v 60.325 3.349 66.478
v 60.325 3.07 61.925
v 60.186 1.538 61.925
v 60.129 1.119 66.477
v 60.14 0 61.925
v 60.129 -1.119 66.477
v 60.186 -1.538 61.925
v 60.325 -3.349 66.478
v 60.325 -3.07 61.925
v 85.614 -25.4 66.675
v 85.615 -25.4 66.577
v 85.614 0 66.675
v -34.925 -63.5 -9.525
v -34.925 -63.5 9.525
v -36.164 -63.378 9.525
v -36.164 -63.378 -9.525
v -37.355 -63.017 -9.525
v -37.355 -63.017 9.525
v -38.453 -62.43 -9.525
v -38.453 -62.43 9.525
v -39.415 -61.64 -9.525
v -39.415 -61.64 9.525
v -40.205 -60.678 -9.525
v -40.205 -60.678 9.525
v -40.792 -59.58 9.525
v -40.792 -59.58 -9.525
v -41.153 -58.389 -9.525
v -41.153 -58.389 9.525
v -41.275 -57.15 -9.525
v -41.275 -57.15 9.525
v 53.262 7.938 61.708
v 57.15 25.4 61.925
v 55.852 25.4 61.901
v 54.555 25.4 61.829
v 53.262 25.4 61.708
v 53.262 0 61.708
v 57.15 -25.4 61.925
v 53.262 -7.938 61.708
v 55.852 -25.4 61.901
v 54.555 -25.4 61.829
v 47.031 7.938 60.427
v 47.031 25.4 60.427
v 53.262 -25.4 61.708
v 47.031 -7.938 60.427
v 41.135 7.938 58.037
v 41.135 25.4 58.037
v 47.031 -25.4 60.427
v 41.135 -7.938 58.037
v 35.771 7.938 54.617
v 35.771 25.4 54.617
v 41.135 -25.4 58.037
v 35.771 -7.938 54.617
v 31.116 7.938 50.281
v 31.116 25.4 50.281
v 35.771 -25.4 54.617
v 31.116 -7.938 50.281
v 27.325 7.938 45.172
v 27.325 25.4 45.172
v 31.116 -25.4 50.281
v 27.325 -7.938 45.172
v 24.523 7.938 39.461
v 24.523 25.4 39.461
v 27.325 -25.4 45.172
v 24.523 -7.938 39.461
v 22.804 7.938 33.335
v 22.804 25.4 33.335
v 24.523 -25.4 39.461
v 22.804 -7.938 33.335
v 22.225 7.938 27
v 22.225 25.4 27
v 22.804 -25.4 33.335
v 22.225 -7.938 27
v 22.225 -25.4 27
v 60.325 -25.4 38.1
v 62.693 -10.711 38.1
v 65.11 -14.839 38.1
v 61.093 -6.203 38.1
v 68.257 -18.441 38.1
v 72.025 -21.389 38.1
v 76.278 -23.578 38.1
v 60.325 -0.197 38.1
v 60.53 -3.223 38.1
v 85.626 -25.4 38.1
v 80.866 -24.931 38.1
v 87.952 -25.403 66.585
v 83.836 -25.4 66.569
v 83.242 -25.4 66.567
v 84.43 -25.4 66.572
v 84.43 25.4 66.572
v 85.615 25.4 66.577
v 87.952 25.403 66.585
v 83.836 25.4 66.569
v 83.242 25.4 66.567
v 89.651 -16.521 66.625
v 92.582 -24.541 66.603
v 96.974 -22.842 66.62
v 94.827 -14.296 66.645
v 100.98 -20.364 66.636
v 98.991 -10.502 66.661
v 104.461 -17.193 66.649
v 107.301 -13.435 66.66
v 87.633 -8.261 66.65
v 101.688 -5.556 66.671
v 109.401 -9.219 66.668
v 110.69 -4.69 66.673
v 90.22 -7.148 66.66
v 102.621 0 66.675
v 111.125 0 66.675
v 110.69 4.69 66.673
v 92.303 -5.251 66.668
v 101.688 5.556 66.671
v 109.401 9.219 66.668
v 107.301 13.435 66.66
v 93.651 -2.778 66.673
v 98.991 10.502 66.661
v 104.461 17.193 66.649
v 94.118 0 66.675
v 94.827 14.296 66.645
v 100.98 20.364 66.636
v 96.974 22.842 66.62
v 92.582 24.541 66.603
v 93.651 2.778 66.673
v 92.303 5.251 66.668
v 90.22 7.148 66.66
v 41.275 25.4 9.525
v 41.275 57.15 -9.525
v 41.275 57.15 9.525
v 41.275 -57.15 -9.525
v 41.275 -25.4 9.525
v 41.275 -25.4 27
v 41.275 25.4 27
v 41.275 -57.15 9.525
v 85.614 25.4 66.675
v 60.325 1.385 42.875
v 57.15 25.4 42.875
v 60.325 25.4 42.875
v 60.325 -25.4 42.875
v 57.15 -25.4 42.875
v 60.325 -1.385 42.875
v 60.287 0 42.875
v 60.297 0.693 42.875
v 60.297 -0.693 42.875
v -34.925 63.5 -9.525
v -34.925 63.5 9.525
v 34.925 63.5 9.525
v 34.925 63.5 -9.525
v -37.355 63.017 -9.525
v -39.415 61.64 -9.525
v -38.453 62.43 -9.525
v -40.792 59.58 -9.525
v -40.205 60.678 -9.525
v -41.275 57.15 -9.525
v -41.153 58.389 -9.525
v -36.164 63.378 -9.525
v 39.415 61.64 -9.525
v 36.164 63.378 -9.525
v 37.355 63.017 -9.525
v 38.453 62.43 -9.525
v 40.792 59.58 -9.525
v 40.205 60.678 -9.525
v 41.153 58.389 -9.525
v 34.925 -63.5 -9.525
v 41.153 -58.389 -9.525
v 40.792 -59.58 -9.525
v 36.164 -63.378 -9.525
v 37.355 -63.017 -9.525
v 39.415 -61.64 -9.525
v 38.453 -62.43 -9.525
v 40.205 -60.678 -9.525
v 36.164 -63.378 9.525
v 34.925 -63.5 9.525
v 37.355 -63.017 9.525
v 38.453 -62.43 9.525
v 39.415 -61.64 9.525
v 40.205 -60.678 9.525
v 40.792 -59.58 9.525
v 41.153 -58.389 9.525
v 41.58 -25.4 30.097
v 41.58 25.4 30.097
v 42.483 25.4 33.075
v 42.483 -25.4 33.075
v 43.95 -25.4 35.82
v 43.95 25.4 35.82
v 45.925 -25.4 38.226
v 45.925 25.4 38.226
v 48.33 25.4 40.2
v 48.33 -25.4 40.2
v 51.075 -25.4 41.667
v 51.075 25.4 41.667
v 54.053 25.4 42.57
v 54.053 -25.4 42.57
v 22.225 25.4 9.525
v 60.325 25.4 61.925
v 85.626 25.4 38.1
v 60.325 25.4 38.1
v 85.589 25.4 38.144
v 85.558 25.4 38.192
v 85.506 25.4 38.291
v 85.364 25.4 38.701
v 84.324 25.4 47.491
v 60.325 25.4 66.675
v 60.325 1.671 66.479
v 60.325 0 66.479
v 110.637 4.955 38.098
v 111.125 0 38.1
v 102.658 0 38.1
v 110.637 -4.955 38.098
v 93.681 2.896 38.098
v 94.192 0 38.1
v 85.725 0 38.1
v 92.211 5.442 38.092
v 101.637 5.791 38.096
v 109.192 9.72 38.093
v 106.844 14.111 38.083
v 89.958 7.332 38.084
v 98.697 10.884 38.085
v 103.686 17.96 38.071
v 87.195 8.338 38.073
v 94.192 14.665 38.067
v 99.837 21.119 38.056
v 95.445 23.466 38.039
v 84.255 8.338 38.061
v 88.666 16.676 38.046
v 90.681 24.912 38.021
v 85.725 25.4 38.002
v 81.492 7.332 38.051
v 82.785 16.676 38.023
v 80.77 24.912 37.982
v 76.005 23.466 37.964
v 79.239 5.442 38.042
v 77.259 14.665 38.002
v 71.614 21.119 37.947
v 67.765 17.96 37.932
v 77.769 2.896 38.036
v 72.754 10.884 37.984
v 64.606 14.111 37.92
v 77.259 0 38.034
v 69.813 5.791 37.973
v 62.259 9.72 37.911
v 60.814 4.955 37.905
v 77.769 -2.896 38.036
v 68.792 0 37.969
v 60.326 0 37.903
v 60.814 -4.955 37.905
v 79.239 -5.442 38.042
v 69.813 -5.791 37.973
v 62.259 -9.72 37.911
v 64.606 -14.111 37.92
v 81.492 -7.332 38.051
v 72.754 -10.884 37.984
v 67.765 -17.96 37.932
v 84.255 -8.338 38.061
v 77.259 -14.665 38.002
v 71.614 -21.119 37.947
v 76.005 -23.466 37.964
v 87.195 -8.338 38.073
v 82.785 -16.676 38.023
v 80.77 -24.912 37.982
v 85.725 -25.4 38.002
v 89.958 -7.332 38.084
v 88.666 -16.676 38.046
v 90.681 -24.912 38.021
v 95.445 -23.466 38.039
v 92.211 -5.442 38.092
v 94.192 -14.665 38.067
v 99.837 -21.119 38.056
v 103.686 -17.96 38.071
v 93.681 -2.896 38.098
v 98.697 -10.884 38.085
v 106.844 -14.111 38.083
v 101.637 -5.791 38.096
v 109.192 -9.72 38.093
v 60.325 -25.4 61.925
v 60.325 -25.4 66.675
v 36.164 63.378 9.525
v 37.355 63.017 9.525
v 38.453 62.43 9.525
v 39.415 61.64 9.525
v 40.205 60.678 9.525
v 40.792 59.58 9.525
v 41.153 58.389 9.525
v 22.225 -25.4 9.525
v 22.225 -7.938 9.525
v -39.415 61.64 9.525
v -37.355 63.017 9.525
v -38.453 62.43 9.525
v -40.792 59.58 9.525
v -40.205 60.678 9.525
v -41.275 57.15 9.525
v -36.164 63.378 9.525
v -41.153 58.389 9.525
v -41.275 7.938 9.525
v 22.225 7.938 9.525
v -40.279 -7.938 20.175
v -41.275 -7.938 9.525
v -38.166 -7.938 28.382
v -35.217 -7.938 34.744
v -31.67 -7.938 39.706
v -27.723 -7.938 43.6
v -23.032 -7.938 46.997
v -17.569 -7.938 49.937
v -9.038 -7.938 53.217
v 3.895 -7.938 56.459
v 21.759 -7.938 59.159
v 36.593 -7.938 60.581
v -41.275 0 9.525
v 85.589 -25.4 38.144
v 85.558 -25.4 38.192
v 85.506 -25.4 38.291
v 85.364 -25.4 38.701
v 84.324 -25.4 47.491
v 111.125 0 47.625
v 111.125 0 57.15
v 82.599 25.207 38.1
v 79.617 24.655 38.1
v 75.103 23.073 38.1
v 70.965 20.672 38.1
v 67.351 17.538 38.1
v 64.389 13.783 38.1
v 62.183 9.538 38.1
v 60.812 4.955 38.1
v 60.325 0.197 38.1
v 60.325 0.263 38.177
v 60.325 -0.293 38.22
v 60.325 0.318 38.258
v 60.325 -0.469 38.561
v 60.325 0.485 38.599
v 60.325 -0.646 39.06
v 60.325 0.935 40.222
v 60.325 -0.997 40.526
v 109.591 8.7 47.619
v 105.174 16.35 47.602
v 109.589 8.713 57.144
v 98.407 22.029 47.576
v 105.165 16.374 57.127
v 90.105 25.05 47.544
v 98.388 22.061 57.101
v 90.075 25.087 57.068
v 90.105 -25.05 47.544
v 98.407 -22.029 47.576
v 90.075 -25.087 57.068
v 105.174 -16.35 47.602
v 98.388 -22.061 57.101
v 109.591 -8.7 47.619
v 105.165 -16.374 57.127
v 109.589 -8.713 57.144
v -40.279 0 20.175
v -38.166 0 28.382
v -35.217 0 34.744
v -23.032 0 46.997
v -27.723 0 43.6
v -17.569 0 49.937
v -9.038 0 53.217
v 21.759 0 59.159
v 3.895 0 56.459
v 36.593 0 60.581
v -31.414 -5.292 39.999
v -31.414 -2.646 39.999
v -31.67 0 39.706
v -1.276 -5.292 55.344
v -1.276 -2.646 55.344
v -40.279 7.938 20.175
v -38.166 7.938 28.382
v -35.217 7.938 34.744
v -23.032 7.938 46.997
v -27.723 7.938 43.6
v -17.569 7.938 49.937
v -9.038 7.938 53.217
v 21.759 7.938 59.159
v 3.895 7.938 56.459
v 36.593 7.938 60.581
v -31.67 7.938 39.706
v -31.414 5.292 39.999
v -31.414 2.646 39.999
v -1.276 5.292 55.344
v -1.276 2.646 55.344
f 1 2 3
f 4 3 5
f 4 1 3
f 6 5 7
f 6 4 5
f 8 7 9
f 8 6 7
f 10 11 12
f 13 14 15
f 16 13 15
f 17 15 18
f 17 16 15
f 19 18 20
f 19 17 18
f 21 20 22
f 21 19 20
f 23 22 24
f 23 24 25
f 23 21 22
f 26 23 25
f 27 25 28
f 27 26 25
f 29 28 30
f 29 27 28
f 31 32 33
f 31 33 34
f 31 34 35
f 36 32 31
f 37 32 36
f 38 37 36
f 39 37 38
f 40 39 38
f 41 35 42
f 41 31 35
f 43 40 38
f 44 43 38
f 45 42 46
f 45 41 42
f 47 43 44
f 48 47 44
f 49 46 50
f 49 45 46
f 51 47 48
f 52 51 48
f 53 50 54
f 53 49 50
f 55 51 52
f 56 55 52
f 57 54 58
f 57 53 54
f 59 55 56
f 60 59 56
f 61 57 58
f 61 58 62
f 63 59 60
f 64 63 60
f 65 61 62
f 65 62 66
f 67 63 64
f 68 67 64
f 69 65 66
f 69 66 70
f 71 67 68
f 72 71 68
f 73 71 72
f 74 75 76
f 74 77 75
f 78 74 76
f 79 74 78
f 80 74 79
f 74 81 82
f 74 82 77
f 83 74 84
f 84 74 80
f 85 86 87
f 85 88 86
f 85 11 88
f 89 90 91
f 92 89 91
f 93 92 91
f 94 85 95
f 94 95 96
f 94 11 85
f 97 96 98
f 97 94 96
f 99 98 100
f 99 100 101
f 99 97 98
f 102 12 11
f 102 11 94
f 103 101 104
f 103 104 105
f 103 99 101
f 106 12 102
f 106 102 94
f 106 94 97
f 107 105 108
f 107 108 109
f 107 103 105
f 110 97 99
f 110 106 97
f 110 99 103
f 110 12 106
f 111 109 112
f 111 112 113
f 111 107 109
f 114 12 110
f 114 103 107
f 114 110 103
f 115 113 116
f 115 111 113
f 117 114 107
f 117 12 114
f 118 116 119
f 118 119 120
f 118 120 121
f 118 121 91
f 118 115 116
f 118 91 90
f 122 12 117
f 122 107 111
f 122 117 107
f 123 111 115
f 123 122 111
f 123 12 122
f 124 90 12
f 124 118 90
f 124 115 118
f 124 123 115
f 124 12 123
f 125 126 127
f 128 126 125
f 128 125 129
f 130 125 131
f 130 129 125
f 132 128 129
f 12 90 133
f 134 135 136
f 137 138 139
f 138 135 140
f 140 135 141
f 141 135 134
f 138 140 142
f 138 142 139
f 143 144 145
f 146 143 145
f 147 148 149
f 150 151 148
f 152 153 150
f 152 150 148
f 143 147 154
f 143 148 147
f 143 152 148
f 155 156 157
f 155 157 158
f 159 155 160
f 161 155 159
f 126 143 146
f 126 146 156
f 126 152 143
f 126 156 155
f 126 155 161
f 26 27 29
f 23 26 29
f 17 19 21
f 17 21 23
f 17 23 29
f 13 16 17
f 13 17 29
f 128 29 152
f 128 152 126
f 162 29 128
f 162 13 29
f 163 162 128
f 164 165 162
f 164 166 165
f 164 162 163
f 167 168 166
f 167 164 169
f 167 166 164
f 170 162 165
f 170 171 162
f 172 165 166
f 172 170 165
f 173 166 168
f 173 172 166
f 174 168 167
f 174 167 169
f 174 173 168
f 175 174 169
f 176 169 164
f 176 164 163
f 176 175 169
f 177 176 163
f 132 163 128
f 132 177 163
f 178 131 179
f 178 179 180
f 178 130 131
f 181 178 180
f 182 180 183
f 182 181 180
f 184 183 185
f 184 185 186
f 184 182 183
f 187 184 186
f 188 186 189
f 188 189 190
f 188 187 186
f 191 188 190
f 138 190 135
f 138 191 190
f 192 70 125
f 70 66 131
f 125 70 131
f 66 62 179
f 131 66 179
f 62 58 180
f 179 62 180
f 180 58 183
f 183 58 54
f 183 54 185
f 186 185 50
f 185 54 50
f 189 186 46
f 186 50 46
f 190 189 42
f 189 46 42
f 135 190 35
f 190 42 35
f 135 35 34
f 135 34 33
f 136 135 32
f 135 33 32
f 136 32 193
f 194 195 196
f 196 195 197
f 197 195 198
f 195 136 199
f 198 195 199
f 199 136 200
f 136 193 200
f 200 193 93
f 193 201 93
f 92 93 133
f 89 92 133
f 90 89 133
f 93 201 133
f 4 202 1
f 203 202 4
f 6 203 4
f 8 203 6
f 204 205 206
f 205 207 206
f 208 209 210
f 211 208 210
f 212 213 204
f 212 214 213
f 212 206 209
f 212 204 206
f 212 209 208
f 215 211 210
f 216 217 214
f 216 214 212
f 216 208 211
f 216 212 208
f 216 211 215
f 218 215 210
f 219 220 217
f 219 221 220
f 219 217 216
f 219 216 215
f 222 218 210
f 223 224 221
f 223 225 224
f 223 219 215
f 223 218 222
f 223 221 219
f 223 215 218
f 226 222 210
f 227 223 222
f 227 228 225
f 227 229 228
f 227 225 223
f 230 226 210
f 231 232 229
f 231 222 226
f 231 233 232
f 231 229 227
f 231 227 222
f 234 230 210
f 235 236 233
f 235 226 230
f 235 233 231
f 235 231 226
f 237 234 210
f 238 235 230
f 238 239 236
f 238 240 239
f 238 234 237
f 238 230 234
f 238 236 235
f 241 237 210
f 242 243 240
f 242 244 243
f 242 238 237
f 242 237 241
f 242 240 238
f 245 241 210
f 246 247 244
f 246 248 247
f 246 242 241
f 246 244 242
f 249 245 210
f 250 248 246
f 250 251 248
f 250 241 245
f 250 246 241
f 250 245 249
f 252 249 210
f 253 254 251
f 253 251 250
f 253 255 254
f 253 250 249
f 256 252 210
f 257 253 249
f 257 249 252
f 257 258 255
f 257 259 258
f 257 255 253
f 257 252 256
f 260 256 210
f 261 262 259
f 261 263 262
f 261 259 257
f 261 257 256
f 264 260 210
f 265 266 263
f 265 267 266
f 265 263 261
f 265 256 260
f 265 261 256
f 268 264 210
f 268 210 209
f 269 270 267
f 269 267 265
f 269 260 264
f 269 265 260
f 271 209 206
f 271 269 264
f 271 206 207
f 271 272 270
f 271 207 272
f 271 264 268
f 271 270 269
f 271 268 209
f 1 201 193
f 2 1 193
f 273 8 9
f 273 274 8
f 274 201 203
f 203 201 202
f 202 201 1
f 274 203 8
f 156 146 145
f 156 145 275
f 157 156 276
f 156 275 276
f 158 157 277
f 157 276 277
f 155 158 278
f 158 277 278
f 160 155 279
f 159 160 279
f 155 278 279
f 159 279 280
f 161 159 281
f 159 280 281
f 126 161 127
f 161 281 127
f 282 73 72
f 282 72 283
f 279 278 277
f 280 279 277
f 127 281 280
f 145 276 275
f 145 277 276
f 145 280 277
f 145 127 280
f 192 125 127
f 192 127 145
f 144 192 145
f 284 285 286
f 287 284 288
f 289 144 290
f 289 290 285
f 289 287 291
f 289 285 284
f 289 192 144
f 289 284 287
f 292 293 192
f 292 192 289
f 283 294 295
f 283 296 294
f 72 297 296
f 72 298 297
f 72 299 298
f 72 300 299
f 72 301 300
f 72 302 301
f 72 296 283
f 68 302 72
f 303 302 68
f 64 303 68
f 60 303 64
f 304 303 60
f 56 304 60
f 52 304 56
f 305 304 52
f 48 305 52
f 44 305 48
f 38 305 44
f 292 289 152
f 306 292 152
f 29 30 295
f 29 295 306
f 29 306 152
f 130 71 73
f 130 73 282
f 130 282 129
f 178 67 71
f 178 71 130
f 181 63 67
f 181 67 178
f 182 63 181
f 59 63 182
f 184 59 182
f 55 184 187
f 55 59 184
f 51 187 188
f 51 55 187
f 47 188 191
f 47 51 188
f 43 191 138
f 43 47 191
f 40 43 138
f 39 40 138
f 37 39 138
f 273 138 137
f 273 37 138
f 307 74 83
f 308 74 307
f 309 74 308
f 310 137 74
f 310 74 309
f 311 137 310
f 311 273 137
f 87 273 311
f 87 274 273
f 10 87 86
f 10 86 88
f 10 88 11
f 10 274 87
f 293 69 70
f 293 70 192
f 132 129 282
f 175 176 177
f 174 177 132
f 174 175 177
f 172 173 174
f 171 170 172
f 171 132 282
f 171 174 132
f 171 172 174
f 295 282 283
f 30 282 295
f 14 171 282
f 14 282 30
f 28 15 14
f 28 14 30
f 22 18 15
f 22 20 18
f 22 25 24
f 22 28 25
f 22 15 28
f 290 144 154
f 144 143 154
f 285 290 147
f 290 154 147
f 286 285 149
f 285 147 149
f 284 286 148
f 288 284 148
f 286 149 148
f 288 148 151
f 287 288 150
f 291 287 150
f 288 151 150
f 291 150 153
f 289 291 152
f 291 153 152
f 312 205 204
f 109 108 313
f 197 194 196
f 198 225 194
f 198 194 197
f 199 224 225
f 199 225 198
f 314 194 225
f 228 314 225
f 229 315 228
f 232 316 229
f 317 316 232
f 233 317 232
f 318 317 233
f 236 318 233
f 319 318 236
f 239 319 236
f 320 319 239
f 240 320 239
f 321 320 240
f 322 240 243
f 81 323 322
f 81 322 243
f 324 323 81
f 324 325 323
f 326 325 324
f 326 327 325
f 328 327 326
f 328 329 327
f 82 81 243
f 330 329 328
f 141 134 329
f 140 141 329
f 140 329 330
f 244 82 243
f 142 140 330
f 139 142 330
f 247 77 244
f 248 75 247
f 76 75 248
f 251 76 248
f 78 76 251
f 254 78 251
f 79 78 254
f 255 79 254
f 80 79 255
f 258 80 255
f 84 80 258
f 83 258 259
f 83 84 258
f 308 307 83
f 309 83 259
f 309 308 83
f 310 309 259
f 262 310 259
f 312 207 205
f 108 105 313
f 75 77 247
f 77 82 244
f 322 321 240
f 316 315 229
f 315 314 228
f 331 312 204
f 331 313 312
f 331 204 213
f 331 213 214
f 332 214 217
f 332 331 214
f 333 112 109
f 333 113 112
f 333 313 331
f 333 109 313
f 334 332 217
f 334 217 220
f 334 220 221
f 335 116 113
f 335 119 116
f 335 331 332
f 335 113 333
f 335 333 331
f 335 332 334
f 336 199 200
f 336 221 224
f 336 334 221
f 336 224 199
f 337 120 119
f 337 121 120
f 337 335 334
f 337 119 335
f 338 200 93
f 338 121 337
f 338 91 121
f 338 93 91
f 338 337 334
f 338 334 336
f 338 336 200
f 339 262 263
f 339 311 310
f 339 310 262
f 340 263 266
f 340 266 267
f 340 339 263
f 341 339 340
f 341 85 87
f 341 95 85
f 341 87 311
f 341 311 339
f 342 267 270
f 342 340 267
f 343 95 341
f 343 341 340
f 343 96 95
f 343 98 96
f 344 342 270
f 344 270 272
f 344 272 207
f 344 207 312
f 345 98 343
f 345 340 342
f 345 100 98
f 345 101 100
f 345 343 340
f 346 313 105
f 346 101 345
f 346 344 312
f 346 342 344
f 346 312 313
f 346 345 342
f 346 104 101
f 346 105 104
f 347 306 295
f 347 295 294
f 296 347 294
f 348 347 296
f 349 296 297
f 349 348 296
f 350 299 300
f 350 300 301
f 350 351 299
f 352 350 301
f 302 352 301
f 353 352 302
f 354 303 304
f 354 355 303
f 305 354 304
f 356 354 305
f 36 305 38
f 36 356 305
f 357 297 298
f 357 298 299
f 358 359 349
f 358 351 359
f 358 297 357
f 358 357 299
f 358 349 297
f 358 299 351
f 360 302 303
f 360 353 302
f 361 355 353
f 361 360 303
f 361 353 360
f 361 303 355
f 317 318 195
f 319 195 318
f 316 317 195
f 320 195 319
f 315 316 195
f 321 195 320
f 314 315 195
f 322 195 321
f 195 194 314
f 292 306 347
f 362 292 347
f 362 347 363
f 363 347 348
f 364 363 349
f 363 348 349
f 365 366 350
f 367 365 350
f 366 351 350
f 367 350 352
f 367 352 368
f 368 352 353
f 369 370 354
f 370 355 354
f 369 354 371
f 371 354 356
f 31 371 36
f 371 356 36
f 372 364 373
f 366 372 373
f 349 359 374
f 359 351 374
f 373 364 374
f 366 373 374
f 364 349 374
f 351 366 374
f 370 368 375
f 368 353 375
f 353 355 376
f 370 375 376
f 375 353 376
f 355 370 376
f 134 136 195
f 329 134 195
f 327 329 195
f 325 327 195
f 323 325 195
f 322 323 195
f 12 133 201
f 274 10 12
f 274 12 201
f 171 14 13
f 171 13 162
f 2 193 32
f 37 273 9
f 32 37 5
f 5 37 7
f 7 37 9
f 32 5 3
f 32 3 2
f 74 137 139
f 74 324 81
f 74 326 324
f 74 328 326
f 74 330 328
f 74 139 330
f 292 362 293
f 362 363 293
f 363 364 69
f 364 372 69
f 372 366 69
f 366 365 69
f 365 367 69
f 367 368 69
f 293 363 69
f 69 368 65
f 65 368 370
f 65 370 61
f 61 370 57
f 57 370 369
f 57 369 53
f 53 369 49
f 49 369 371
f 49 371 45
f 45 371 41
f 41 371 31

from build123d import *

# Parameters (mm, degrees)
F1_DEPTH = 63.5
F2_DEPTH = 25.4
F3_DEPTH = 7.9375
F5_R     = 6.35


with BuildPart() as f1:
    # F0 (on Front) → F1 (new body, symmetric)
    with BuildSketch(Plane.XZ):
        Polygon((41.275, -9.525), (41.275, 9.525), (22.225, 9.525), (-41.275, 9.525), (-41.275, -9.525), align=None)
    extrude(amount=F1_DEPTH, both=True)

    # F0 (on Front) → F2 (join, symmetric)
    with BuildSketch(Plane.XZ):
        with BuildLine():
            ThreePointArc((57.15, 61.9252), (55.2030666201, 61.8708907791), (53.2621882973, 61.7081320209))
            add(Edge.make_bspline(
                [(53.2621882973, 61.7081320209), (54.5429566501, 61.7819276715), (55.8388527662, 61.8542223335), (57.15, 61.9252)],
                knots=[109.4465392836, 109.4465392836, 109.4465392836, 109.4465392836, 111.5045361635, 111.5045361635, 111.5045361635, 111.5045361635], degree=3))
        make_face()
        Polygon((41.275, -9.525), (41.275, 9.525), (22.225, 9.525), (-41.275, 9.525), (-41.275, -9.525), align=None)
        with BuildLine():
            Line((22.225, 9.525), (41.275, 9.525))
            Line((41.275, 9.525), (41.275, 27.0002))
            ThreePointArc((41.275, 27.0002), (45.9246798487, 38.2255201513), (57.15, 42.8752))
            Line((57.15, 42.8752), (60.325, 42.8752))
            Line((60.325, 42.8752), (60.325, 61.9252))
            Line((60.325, 61.9252), (57.15, 61.9252))
            add(Edge.make_bspline(
                [(53.2621882973, 61.7081320209), (54.5429566501, 61.7819276715), (55.8388527662, 61.8542223335), (57.15, 61.9252)],
                knots=[109.4465392836, 109.4465392836, 109.4465392836, 109.4465392836, 111.5045361635, 111.5045361635, 111.5045361635, 111.5045361635], degree=3))
            ThreePointArc((53.2621882973, 61.7081320209), (31.11600829, 50.2808121191), (22.225, 27.0002))
            Line((22.225, 27.0002), (22.225, 9.525))
        make_face()
        Polygon((60.325, 61.9252), (60.325, 42.8752), (60.325, 38.1), (85.725, 38.1), (85.6142267585, 66.675), (60.325, 66.675), align=None)
    extrude(amount=F2_DEPTH, both=True)

    # F0 (on Front) → F3 (join, symmetric)
    with BuildSketch(Plane.XZ):
        with BuildLine():
            ThreePointArc((57.15, 61.9252), (55.2030666201, 61.8708907791), (53.2621882973, 61.7081320209))
            add(Edge.make_bspline(
                [(53.2621882973, 61.7081320209), (54.5429566501, 61.7819276715), (55.8388527662, 61.8542223335), (57.15, 61.9252)],
                knots=[109.4465392836, 109.4465392836, 109.4465392836, 109.4465392836, 111.5045361635, 111.5045361635, 111.5045361635, 111.5045361635], degree=3))
        make_face()
        Polygon((41.275, -9.525), (41.275, 9.525), (22.225, 9.525), (-41.275, 9.525), (-41.275, -9.525), align=None)
        with BuildLine():
            Line((-41.275, 9.525), (22.225, 9.525))
            Line((22.225, 9.525), (22.225, 27.0002))
            ThreePointArc((22.225, 27.0002), (31.11600829, 50.2808121191), (53.2621882973, 61.7081320209))
            add(Edge.make_bspline(
                [(-41.275, 9.525), (-40.1783672468, 49.6139237835), (-14.8504824304, 57.7835980928), (53.2621882973, 61.7081320209)],
                knots=[0, 0, 0, 0, 109.4465392836, 109.4465392836, 109.4465392836, 109.4465392836], degree=3))
        make_face()
        Polygon((60.325, 61.9252), (60.325, 42.8752), (60.325, 38.1), (85.725, 38.1), (85.6142267585, 66.675), (60.325, 66.675), align=None)
        with BuildLine():
            Line((22.225, 9.525), (41.275, 9.525))
            Line((41.275, 9.525), (41.275, 27.0002))
            ThreePointArc((41.275, 27.0002), (45.9246798487, 38.2255201513), (57.15, 42.8752))
            Line((57.15, 42.8752), (60.325, 42.8752))
            Line((60.325, 42.8752), (60.325, 61.9252))
            Line((60.325, 61.9252), (57.15, 61.9252))
            add(Edge.make_bspline(
                [(53.2621882973, 61.7081320209), (54.5429566501, 61.7819276715), (55.8388527662, 61.8542223335), (57.15, 61.9252)],
                knots=[109.4465392836, 109.4465392836, 109.4465392836, 109.4465392836, 111.5045361635, 111.5045361635, 111.5045361635, 111.5045361635], degree=3))
            ThreePointArc((53.2621882973, 61.7081320209), (31.11600829, 50.2808121191), (22.225, 27.0002))
            Line((22.225, 27.0002), (22.225, 9.525))
        make_face()
    extrude(amount=F3_DEPTH, both=True)

    # F0 (on Front) → F4 (revolve)
    with BuildSketch(Plane.XZ):
        Polygon((85.6142267585, 66.675), (85.725, 38.1), (111.125, 38.1), (111.125, 66.675), align=None)
    revolve(axis=Axis((85.6696133792, 0, 52.3875), (-0.0038765498, 0, 0.9999924862)))

    # F5
    f5_edges = [f1.edges().sort_by_distance(p)[0] for p in [
        (41.275, -63.5, 0),
        (41.275, 63.5, 0),
        (-41.275, 63.5, 0),
        (-41.275, -63.5, 0),
    ]]
    fillet(f5_edges, radius=F5_R)


solid = f1.part
